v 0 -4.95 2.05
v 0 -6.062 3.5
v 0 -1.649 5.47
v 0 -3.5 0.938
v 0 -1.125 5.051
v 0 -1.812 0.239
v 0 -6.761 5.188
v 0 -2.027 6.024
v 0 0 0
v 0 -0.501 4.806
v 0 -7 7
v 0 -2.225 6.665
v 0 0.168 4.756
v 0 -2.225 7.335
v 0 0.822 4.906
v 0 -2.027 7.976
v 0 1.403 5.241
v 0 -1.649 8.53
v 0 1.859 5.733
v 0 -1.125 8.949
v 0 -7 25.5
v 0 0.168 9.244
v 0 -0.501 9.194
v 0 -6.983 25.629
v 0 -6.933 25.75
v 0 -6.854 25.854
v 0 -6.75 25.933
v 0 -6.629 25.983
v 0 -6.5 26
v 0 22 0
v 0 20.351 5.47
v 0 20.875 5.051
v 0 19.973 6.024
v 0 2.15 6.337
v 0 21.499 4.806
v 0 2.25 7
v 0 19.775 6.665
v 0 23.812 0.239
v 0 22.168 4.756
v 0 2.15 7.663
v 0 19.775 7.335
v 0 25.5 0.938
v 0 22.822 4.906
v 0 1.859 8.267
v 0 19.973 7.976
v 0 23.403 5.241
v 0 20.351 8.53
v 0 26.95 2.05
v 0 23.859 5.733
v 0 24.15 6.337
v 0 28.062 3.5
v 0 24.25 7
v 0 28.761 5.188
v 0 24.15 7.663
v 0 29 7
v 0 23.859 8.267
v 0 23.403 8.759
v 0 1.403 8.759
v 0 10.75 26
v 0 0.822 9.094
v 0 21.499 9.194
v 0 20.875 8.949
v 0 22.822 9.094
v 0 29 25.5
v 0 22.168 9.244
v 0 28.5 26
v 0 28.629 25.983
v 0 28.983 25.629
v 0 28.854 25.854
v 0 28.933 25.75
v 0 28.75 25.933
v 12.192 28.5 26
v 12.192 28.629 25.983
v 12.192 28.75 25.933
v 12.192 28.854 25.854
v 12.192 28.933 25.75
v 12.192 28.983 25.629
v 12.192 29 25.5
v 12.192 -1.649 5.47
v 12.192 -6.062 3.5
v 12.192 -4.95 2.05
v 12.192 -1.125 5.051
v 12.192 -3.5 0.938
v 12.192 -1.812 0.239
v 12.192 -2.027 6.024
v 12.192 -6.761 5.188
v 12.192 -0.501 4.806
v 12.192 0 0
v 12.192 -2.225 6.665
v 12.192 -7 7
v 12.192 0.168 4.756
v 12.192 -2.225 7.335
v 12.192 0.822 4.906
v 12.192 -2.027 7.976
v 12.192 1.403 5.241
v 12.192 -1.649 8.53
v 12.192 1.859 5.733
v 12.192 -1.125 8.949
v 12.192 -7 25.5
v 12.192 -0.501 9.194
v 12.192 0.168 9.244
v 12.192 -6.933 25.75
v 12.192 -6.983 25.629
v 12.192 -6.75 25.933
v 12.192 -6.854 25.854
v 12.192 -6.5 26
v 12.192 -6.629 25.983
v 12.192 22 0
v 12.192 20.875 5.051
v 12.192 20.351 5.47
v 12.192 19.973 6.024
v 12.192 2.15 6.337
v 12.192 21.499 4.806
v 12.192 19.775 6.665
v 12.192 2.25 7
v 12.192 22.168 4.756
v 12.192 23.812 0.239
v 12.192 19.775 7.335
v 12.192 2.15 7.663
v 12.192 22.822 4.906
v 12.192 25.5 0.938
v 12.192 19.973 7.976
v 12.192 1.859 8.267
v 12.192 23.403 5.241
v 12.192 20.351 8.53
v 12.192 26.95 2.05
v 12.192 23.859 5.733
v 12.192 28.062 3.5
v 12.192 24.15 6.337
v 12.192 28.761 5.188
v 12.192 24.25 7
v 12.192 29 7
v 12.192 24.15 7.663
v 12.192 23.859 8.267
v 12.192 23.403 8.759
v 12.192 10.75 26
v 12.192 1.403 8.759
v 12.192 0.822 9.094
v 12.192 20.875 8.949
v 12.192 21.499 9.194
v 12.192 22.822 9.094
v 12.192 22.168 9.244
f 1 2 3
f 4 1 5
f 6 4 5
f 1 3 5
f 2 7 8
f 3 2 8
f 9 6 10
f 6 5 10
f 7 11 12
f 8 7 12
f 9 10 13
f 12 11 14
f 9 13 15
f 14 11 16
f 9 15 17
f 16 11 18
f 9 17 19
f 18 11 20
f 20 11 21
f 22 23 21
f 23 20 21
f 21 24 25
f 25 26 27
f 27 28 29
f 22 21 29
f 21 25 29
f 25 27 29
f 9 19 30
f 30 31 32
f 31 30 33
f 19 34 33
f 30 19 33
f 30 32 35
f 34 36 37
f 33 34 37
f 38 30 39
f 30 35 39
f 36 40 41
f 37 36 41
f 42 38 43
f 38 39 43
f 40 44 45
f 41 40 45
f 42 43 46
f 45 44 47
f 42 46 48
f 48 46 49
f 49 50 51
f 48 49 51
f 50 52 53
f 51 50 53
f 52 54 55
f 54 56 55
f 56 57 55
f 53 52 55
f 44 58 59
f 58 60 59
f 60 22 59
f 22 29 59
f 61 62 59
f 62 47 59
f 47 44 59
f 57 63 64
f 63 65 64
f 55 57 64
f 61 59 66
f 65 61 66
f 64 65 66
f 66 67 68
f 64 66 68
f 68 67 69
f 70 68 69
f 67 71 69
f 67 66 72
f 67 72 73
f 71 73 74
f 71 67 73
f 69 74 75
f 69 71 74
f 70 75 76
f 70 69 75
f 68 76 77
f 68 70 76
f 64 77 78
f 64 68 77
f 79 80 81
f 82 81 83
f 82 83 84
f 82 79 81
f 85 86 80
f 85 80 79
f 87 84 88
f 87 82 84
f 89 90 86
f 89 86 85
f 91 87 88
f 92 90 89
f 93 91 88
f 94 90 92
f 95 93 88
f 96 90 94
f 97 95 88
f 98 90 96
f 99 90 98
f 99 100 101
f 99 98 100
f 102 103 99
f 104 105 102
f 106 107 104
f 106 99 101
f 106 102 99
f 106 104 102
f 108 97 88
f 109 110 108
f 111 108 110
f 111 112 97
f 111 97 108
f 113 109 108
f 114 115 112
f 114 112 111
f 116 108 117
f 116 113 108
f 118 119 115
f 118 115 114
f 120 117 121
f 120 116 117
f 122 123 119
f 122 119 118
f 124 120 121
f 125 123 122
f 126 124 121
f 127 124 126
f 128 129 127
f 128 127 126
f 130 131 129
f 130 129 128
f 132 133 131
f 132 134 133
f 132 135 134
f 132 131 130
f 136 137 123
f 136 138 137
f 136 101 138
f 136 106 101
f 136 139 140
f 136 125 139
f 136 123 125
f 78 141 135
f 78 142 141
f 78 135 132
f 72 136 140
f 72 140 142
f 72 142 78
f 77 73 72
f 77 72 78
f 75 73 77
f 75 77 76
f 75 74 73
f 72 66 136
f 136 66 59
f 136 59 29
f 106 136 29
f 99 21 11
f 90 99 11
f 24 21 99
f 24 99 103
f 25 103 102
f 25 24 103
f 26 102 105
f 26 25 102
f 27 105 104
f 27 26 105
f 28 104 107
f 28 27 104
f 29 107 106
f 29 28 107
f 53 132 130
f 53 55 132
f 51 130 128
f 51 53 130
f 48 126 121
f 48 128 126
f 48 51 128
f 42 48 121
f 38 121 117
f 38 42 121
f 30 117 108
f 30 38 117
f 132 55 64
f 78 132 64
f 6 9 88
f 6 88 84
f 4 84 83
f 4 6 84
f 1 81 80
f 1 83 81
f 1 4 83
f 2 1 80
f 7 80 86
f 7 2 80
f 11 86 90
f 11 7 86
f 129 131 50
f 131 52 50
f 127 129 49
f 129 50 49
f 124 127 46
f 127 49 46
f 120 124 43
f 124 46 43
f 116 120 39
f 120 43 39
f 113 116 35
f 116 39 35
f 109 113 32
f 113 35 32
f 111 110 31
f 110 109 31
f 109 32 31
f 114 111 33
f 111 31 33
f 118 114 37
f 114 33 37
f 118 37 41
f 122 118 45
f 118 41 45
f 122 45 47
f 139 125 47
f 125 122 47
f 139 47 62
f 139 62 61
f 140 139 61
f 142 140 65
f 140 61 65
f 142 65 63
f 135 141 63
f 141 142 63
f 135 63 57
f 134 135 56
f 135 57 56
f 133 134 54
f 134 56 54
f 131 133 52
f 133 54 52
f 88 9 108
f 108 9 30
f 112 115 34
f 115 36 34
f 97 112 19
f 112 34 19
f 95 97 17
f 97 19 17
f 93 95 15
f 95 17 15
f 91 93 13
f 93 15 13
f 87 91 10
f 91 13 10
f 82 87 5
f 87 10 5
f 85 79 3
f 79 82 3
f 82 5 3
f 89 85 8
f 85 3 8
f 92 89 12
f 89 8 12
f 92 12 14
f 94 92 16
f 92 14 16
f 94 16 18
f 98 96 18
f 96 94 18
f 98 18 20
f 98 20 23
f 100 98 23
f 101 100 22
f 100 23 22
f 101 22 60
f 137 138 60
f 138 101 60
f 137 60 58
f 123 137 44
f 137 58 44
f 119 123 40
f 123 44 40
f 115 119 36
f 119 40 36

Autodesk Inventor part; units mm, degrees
ref_plane "YZ Plane" through (0, 0, 0) normal (1, 0, 0) x (0, 1, 0)
ref_plane "XZ Plane" through (0, 0, 0) normal (0, 1, 0) x (-1, 0, 0)
ref_plane "XY Plane" through (0, 0, 0) normal (0, 0, 1) x (1, 0, 0)
sketch "Sketch1" plane through (0, 0, 0) normal (1, 0, 0) x (0, 1, 0)
  line L0 (10.75, 26) -> (-6.5, 26)
  arc A0 (-6.5, 26) -> (-7, 25.5) centre (-6.5, 25.5) ccw
  line L1 (-7, 25.5) -> (-7, 7)
  arc A1 (-7, 7) -> (0, 0) centre (0, 7) ccw
  line L2 (0, 0) -> (22, 0)
  arc A2 (22, 0) -> (29, 7) centre (22, 7) ccw
  line L3 (29, 7) -> (29, 25.5)
  arc A3 (29, 25.5) -> (28.5, 26) centre (28.5, 25.5) ccw
  line L4 (28.5, 26) -> (-6.5, 26)
  circle A4 centre (0, 7) radius 2.25
  circle A5 centre (22, 7) radius 2.25
  point P0 (0, 0)
  point P1 (-7, 7)
  point P2 (0, 0)
extrude "Extrusion1" add sketch "Sketch1" along normal blind 12.192
